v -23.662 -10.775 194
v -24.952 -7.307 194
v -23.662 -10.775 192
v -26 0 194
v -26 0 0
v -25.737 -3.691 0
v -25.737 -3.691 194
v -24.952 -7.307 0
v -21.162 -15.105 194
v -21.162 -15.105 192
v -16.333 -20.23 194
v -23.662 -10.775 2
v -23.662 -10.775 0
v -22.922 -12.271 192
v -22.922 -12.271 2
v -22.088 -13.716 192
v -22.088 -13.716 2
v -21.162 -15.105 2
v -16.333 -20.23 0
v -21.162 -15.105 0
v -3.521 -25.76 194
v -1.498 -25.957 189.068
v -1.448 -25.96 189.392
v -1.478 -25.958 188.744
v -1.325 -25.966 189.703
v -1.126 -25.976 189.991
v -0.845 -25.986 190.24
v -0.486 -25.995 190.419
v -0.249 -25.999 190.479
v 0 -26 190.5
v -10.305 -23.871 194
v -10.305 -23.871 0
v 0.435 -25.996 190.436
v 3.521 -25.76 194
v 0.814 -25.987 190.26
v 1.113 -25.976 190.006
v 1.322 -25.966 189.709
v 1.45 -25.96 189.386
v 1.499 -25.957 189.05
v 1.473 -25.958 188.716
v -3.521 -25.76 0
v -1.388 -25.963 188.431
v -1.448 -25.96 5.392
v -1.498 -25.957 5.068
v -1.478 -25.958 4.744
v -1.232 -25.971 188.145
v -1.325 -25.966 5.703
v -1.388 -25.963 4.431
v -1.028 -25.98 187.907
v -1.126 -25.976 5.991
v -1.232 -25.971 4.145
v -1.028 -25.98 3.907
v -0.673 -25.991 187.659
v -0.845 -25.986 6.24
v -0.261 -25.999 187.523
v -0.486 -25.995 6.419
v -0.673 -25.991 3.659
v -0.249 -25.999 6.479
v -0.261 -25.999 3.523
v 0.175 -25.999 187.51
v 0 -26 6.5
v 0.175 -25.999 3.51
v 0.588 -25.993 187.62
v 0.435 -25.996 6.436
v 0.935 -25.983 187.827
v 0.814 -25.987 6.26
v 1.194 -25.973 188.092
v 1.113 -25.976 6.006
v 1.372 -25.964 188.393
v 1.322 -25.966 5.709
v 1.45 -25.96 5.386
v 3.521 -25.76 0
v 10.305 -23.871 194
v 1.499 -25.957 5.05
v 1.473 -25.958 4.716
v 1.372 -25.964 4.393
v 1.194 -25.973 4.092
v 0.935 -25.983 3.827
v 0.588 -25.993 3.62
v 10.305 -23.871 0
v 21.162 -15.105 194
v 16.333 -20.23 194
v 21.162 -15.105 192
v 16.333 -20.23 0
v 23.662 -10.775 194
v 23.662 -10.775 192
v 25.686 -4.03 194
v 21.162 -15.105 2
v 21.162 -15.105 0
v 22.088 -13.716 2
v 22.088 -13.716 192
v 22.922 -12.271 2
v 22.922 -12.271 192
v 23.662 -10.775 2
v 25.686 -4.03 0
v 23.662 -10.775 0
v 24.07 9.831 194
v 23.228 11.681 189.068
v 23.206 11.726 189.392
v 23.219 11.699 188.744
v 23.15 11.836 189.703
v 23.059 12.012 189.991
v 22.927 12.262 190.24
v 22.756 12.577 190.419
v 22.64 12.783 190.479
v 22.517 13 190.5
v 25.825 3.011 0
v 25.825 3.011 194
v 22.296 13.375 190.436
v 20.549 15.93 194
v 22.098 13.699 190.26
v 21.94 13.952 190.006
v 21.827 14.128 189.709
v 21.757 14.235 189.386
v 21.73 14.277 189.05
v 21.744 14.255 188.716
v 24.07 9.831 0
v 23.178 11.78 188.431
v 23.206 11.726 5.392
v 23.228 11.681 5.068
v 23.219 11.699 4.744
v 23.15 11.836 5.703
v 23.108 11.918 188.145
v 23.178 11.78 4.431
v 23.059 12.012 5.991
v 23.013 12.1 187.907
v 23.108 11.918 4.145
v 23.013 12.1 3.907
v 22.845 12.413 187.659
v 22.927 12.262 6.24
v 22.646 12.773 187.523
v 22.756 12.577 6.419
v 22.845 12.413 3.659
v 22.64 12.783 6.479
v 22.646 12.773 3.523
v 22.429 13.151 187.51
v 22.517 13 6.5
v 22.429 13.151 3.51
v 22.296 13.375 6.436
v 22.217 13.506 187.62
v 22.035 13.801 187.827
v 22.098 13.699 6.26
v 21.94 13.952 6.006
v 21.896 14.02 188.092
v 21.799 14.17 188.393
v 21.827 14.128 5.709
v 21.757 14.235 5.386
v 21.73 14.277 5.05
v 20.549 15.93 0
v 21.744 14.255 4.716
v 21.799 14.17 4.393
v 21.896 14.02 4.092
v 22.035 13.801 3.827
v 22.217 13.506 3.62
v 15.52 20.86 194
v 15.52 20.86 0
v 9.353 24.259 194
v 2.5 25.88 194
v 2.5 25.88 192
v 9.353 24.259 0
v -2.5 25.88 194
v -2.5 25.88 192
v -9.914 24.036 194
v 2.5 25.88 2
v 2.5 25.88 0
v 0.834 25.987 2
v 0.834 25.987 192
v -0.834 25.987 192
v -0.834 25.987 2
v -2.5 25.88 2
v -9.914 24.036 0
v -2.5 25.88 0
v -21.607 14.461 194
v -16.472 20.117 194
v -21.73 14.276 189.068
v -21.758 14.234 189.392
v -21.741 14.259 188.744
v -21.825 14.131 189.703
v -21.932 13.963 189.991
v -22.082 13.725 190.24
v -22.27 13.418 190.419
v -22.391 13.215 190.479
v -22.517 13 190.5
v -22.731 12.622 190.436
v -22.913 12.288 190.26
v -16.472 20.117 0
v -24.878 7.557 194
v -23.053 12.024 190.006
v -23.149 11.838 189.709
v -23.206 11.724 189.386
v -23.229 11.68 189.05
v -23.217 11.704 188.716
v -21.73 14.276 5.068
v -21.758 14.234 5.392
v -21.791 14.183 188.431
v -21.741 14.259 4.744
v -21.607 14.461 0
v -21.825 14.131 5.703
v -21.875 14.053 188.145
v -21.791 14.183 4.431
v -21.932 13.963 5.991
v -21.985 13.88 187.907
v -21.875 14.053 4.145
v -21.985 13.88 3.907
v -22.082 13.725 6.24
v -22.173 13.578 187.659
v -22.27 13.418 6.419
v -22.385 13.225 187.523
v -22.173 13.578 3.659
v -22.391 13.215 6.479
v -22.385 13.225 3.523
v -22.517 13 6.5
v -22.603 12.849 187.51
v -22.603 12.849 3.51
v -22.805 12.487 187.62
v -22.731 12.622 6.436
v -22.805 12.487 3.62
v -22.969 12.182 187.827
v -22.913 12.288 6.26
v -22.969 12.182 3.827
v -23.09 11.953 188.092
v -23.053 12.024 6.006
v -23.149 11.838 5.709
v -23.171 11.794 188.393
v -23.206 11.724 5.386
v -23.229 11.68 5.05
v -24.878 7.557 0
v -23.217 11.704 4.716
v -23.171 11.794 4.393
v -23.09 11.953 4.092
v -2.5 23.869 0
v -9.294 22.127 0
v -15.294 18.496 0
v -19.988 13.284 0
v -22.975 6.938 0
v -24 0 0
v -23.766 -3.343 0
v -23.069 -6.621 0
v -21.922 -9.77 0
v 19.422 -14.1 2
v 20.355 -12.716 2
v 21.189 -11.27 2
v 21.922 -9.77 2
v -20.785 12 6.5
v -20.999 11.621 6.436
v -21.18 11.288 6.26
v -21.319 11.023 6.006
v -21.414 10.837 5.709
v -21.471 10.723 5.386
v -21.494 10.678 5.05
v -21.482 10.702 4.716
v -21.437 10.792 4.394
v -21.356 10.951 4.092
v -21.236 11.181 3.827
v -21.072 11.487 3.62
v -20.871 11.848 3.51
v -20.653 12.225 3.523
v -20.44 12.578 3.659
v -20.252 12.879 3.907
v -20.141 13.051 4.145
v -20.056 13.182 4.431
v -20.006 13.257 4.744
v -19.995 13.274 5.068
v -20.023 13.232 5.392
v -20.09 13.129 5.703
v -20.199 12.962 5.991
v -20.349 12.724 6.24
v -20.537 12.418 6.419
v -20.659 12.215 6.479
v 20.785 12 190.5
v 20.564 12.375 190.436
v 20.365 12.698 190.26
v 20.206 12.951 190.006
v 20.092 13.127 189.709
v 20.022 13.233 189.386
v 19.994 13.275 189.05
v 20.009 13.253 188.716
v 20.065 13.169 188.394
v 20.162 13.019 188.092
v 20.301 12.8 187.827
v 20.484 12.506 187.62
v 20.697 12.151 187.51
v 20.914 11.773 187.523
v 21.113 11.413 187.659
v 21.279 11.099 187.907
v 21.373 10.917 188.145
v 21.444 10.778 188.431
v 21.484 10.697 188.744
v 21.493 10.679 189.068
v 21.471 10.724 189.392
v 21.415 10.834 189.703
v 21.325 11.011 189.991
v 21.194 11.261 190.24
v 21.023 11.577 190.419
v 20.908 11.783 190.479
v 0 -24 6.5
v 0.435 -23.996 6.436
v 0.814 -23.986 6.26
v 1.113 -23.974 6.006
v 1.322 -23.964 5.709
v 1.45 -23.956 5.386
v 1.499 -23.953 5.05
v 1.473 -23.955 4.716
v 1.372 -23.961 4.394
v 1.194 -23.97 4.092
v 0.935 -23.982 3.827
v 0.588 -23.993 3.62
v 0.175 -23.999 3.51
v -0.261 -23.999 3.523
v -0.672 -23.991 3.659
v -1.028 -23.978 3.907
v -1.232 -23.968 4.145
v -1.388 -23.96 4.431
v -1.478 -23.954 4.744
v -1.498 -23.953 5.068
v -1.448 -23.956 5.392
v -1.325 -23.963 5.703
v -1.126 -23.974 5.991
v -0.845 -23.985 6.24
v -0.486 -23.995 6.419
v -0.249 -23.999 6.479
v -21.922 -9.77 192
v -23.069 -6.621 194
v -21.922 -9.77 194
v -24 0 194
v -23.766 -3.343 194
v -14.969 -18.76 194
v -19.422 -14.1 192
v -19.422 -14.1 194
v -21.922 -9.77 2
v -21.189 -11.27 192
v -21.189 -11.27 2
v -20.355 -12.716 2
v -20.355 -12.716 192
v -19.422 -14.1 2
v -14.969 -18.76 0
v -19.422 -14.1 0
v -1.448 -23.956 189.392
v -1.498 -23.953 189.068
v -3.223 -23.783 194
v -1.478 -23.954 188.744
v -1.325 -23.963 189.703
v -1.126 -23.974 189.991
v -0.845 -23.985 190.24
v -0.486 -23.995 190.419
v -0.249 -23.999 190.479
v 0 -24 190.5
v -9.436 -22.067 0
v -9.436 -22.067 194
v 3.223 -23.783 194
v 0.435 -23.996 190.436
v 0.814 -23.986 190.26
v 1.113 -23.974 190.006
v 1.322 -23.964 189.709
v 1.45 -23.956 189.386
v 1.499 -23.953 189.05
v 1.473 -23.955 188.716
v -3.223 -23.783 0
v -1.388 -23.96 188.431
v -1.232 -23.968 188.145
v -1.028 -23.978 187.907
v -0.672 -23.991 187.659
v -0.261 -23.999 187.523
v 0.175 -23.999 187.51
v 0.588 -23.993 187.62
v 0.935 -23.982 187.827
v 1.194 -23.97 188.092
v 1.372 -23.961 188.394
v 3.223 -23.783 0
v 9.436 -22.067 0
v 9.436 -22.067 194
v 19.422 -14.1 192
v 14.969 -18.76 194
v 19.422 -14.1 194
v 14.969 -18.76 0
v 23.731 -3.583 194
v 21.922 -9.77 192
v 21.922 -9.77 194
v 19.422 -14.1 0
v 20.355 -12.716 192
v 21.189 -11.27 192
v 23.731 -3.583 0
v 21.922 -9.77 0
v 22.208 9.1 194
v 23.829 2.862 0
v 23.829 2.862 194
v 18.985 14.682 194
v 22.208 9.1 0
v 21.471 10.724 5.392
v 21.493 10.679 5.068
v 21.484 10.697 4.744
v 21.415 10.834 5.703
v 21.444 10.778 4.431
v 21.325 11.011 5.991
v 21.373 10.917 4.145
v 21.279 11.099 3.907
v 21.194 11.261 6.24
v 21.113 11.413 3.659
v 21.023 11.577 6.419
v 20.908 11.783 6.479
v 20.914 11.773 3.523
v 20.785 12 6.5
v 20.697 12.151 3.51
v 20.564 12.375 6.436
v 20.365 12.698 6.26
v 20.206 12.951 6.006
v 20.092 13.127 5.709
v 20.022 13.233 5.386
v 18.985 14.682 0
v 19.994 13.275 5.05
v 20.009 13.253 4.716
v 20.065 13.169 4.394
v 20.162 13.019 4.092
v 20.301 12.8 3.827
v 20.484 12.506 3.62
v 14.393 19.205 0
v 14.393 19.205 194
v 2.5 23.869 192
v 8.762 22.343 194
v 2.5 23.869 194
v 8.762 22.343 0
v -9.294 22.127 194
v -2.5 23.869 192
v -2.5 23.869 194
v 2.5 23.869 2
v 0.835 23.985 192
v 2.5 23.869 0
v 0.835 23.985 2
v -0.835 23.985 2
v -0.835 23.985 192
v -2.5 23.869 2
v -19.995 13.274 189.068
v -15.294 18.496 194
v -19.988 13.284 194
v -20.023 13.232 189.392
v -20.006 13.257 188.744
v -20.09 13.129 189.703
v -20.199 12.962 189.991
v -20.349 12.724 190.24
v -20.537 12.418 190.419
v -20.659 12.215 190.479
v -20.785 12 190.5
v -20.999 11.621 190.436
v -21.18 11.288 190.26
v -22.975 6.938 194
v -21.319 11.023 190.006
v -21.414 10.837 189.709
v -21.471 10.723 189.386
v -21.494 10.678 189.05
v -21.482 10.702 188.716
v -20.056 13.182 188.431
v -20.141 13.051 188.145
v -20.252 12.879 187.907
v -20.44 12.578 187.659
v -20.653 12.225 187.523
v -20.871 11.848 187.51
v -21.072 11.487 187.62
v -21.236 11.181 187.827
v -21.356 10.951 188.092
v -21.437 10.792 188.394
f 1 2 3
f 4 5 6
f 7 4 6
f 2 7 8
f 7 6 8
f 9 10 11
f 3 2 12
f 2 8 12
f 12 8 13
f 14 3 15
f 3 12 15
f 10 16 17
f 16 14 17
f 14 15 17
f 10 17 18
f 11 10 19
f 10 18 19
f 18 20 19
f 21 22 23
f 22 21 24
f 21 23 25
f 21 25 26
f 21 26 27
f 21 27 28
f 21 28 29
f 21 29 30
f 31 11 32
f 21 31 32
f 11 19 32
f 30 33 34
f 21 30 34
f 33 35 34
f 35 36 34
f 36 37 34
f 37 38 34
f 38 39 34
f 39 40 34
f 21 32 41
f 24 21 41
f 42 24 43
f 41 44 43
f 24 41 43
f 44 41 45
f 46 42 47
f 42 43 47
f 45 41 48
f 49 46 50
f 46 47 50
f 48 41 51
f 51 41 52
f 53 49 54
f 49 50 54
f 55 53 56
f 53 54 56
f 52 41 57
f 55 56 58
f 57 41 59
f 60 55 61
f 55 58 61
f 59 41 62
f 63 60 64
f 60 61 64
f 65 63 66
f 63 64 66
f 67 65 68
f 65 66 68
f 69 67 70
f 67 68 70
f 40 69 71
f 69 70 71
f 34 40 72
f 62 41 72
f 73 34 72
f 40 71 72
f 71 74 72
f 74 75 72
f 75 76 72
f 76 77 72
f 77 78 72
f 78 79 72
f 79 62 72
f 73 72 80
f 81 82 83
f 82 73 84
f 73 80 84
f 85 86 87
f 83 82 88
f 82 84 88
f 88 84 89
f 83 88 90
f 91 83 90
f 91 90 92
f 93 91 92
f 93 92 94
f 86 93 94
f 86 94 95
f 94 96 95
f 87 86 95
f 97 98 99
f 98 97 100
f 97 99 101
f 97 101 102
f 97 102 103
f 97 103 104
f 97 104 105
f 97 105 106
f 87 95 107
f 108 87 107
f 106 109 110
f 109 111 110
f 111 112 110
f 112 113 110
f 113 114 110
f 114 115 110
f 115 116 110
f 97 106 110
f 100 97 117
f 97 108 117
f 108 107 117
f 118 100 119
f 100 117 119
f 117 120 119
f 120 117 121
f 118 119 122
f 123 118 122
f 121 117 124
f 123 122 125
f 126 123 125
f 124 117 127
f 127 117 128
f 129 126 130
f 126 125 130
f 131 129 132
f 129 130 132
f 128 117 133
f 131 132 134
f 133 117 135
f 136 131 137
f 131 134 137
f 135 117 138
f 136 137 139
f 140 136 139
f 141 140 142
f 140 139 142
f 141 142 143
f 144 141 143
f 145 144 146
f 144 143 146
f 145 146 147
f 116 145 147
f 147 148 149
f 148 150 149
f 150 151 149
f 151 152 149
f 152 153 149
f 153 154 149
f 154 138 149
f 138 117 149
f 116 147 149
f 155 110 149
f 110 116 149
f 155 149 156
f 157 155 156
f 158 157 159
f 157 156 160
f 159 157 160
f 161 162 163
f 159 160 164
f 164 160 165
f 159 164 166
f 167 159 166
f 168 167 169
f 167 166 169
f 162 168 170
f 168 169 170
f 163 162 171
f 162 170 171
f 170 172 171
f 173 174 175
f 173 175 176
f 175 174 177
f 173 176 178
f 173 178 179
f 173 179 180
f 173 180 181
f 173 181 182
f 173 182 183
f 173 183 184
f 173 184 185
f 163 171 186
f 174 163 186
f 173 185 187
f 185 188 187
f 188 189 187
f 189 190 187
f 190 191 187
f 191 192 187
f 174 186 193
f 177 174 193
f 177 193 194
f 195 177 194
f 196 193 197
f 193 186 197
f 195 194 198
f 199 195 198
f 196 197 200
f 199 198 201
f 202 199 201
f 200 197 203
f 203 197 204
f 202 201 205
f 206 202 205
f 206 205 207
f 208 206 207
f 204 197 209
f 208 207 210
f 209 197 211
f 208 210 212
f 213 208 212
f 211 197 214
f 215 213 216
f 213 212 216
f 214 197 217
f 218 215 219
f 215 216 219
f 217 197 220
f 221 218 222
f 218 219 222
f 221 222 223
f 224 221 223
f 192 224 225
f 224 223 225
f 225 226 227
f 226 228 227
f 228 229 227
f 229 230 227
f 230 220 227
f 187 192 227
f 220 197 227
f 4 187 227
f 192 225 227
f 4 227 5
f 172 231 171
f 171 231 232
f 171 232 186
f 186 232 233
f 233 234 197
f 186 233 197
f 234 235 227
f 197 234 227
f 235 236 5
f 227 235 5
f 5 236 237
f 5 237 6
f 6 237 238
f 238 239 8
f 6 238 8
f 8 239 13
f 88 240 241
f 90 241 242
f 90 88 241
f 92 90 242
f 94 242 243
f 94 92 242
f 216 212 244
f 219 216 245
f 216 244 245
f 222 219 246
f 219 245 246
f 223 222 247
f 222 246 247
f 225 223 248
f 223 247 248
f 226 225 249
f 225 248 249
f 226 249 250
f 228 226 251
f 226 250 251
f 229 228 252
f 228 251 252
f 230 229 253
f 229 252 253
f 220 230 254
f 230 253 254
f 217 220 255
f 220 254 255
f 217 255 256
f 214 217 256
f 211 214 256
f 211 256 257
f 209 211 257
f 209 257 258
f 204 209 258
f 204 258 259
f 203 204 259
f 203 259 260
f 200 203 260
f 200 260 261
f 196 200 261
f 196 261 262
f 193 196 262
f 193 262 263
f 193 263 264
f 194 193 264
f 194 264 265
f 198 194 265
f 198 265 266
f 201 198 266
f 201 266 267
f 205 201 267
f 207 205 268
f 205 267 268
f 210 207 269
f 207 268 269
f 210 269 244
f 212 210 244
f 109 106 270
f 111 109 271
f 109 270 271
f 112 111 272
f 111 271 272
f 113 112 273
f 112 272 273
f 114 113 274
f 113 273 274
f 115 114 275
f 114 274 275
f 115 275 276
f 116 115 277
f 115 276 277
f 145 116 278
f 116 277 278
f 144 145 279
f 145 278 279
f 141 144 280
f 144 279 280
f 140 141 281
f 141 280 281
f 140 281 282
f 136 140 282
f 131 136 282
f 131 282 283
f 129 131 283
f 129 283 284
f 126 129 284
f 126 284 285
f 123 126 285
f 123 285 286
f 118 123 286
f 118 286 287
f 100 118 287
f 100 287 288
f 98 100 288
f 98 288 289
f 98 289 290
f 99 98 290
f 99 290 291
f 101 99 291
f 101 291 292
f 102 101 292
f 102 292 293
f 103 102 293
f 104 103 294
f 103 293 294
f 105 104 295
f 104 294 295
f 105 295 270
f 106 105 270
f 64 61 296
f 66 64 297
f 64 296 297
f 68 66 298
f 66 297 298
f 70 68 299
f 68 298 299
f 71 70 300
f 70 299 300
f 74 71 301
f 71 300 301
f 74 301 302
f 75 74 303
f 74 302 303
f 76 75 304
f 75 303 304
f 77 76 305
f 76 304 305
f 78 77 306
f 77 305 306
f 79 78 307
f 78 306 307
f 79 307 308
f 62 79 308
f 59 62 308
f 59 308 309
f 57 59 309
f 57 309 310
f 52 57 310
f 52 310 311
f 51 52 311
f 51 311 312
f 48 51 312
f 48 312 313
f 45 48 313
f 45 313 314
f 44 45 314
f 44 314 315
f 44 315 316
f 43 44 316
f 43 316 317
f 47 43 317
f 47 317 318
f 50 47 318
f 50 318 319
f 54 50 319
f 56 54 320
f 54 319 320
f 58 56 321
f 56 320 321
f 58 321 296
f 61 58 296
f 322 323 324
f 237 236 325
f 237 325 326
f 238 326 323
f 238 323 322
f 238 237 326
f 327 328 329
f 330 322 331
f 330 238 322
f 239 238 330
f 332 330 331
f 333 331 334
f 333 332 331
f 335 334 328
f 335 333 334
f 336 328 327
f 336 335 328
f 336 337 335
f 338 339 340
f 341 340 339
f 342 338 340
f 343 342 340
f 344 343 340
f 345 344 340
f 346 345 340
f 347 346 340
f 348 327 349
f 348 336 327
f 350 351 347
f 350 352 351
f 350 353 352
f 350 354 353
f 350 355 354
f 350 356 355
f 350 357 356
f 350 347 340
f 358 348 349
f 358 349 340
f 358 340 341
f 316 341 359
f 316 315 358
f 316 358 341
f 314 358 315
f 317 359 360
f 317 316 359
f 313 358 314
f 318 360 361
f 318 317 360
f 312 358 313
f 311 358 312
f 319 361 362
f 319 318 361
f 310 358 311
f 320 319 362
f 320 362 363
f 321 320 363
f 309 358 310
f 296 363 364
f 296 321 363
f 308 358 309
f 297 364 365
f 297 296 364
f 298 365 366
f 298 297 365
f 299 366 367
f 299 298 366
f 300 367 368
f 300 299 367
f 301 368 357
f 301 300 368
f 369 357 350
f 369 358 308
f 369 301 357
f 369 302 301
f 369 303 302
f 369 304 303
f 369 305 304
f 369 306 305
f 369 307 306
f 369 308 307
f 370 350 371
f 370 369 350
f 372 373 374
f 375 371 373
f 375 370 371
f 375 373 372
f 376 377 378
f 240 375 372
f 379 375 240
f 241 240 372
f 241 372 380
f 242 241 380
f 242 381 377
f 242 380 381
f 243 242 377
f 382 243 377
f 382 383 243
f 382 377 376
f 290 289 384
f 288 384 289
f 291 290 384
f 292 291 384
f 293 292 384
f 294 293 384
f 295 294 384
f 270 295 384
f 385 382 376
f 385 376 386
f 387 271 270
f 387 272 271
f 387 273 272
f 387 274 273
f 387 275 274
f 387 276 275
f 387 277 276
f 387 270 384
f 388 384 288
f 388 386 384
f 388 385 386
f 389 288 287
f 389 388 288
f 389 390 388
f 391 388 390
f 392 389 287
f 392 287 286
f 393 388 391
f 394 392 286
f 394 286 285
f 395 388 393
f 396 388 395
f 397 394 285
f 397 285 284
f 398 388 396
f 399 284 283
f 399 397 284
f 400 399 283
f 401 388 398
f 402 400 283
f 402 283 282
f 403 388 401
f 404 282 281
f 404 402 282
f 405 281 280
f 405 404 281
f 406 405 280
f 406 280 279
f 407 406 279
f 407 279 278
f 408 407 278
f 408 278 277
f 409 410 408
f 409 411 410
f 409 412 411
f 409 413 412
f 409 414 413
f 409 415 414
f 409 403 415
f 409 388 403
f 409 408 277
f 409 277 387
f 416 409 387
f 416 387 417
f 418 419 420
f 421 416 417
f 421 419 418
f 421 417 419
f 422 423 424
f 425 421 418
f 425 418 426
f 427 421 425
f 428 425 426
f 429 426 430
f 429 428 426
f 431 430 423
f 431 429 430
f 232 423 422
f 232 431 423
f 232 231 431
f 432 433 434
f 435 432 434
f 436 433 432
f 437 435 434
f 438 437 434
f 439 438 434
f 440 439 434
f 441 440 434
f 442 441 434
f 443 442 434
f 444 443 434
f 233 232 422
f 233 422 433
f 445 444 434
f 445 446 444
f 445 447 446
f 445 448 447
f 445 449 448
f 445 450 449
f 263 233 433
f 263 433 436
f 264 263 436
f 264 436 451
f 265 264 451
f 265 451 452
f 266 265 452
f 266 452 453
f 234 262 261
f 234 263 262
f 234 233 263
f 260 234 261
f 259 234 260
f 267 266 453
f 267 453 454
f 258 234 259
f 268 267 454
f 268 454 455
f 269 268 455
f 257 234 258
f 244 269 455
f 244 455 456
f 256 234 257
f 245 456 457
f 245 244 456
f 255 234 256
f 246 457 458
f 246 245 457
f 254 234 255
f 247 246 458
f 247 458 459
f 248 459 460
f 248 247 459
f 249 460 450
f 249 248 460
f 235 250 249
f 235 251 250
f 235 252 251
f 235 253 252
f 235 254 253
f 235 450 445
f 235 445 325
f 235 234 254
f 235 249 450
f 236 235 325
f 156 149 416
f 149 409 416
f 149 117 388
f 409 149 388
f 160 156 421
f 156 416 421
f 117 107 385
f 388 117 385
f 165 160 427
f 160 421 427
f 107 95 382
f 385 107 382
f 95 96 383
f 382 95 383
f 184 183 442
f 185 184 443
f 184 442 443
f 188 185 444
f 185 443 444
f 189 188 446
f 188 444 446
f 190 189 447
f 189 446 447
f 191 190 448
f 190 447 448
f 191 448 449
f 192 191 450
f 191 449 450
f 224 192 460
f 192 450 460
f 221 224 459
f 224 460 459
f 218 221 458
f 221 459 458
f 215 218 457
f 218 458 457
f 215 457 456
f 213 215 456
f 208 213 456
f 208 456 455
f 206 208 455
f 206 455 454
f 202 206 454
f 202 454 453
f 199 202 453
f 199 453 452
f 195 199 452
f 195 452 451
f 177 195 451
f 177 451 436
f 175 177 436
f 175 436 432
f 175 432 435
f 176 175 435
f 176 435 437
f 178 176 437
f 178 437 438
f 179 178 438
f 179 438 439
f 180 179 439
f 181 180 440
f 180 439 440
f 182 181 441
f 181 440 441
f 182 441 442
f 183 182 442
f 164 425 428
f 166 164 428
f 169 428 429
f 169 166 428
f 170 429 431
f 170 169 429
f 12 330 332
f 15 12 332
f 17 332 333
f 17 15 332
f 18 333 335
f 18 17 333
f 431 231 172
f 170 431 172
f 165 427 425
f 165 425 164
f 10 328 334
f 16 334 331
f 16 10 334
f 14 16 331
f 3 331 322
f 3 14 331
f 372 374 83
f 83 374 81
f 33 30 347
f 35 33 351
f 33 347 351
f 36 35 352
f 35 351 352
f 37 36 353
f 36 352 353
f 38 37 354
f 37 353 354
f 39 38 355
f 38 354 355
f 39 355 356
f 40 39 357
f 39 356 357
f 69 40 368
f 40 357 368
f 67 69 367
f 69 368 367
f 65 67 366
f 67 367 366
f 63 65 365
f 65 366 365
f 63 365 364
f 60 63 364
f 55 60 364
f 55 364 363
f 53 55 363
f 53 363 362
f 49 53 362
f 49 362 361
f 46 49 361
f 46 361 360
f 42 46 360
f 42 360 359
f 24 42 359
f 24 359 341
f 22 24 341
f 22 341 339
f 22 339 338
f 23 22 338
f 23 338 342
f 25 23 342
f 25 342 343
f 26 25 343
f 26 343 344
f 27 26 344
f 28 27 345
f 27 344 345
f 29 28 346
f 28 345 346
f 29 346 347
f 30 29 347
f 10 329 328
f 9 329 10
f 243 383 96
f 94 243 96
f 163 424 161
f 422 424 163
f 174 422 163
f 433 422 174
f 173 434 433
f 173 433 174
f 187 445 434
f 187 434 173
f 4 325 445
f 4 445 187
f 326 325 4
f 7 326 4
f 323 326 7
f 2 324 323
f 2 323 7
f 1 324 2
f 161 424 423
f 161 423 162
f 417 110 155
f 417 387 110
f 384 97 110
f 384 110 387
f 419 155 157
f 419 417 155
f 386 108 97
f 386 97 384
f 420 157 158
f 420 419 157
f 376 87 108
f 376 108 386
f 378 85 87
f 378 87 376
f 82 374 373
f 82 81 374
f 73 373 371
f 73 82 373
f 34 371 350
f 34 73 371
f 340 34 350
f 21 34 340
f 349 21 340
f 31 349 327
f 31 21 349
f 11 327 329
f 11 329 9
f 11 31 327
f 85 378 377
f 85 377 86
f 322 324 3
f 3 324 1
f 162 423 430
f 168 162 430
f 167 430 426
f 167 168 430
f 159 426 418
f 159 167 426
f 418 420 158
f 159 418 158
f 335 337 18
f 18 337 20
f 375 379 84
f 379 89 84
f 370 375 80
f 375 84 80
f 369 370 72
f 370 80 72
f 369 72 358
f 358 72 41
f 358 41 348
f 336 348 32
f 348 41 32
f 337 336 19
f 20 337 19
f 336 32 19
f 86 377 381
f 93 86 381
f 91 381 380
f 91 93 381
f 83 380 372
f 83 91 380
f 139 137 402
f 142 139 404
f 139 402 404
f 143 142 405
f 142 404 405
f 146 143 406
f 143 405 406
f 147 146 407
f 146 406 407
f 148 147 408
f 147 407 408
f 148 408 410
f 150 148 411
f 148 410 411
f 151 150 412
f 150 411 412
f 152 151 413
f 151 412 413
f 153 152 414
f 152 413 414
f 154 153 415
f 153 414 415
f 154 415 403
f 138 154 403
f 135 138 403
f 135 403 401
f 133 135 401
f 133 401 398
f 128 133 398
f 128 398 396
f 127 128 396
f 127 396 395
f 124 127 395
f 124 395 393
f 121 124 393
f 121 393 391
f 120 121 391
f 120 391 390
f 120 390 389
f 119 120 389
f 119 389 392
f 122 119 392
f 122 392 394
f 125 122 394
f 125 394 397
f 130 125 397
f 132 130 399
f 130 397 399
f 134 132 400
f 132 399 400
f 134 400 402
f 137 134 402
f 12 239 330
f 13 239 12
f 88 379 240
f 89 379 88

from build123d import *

# Parameters (mm, degrees)
SKETCH_1_R               = 26
SKETCH_1_R_2             = 24
EXTRUDE_1_DEPTH          = 194
SKETCH_2_R               = 1.5
CUT_EXTRUDE_1_DEPTH      = 88
PATTERN_CIRCULAR_1_COUNT = 3
SKETCH_3_W               = 5
SKETCH_3_H               = 11.473941433
CUT_EXTRUDE_2_DEPTH      = 2
PATTERN_CIRCULAR_2_COUNT = 3
SKETCH_4_W               = 5
SKETCH_4_H               = 11.473941433
CUT_EXTRUDE_3_DEPTH      = 2
PATTERN_CIRCULAR_3_COUNT = 3


with BuildPart() as part:
    # Эскиз1 → Бобышка-Вытянуть1 (new body)
    with BuildSketch(Plane.XY):
        with Locations(Location((0, 0, 0), (0, 0, 180))):
            Circle(SKETCH_1_R)
        with Locations(Location((0, 0, 0), (0, 0, 180))):
            Circle(SKETCH_1_R_2, mode=Mode.SUBTRACT)
    extrude(amount=EXTRUDE_1_DEPTH)

    # Эскиз2 → Вырез-Вытянуть1 (cut)
    with BuildSketch(Plane(origin=(0, 0, 0), x_dir=(1, 0, 0), z_dir=(0, 1, 0))):
        with Locations(Location((0, -5, 0), (0, 0, 270))):
            Circle(SKETCH_2_R)
        with Locations(Location((0, -189, 0), (0, 0, 270))):
            Circle(SKETCH_2_R)
    cut_extrude_1 = extrude(amount=-CUT_EXTRUDE_1_DEPTH, mode=Mode.SUBTRACT)

    # Круговой массив1: Вырез-Вытянуть1 ×3 about axis
    pattern_circular_1_axis = Axis((0, 0, 194), (0, 0, -1))
    for i in range(1, PATTERN_CIRCULAR_1_COUNT):
        add(cut_extrude_1.rotate(pattern_circular_1_axis, i * 360 / PATTERN_CIRCULAR_1_COUNT), mode=Mode.SUBTRACT)

    # Эскиз3 → Вырез-Вытянуть2 (cut)
    with BuildSketch(Plane(origin=(0, 0, 0), x_dir=(-1, 0, 0), z_dir=(0, 0, -1))):
        with Locations((0, 22.870937025)):
            Rectangle(SKETCH_3_W, SKETCH_3_H)
    cut_extrude_2 = extrude(amount=-CUT_EXTRUDE_2_DEPTH, mode=Mode.SUBTRACT)

    # Круговой массив2: Вырез-Вытянуть2 ×3 about axis
    pattern_circular_2_axis = Axis((0, 0, 0), (0, 0, 1))
    for i in range(1, PATTERN_CIRCULAR_2_COUNT):
        add(cut_extrude_2.rotate(pattern_circular_2_axis, i * 360 / PATTERN_CIRCULAR_2_COUNT), mode=Mode.SUBTRACT)

    # Эскиз4 → Вырез-Вытянуть3 (cut)
    with BuildSketch(Plane.XY.offset(194)):
        with Locations((0, 22.870937025)):
            Rectangle(SKETCH_4_W, SKETCH_4_H)
    cut_extrude_3 = extrude(amount=-CUT_EXTRUDE_3_DEPTH, mode=Mode.SUBTRACT)

    # Круговой массив3: Вырез-Вытянуть3 ×3 about axis
    pattern_circular_3_axis = Axis((0, 0, 0), (0, 0, 1))
    for i in range(1, PATTERN_CIRCULAR_3_COUNT):
        add(cut_extrude_3.rotate(pattern_circular_3_axis, i * 360 / PATTERN_CIRCULAR_3_COUNT), mode=Mode.SUBTRACT)


solid = part.part
